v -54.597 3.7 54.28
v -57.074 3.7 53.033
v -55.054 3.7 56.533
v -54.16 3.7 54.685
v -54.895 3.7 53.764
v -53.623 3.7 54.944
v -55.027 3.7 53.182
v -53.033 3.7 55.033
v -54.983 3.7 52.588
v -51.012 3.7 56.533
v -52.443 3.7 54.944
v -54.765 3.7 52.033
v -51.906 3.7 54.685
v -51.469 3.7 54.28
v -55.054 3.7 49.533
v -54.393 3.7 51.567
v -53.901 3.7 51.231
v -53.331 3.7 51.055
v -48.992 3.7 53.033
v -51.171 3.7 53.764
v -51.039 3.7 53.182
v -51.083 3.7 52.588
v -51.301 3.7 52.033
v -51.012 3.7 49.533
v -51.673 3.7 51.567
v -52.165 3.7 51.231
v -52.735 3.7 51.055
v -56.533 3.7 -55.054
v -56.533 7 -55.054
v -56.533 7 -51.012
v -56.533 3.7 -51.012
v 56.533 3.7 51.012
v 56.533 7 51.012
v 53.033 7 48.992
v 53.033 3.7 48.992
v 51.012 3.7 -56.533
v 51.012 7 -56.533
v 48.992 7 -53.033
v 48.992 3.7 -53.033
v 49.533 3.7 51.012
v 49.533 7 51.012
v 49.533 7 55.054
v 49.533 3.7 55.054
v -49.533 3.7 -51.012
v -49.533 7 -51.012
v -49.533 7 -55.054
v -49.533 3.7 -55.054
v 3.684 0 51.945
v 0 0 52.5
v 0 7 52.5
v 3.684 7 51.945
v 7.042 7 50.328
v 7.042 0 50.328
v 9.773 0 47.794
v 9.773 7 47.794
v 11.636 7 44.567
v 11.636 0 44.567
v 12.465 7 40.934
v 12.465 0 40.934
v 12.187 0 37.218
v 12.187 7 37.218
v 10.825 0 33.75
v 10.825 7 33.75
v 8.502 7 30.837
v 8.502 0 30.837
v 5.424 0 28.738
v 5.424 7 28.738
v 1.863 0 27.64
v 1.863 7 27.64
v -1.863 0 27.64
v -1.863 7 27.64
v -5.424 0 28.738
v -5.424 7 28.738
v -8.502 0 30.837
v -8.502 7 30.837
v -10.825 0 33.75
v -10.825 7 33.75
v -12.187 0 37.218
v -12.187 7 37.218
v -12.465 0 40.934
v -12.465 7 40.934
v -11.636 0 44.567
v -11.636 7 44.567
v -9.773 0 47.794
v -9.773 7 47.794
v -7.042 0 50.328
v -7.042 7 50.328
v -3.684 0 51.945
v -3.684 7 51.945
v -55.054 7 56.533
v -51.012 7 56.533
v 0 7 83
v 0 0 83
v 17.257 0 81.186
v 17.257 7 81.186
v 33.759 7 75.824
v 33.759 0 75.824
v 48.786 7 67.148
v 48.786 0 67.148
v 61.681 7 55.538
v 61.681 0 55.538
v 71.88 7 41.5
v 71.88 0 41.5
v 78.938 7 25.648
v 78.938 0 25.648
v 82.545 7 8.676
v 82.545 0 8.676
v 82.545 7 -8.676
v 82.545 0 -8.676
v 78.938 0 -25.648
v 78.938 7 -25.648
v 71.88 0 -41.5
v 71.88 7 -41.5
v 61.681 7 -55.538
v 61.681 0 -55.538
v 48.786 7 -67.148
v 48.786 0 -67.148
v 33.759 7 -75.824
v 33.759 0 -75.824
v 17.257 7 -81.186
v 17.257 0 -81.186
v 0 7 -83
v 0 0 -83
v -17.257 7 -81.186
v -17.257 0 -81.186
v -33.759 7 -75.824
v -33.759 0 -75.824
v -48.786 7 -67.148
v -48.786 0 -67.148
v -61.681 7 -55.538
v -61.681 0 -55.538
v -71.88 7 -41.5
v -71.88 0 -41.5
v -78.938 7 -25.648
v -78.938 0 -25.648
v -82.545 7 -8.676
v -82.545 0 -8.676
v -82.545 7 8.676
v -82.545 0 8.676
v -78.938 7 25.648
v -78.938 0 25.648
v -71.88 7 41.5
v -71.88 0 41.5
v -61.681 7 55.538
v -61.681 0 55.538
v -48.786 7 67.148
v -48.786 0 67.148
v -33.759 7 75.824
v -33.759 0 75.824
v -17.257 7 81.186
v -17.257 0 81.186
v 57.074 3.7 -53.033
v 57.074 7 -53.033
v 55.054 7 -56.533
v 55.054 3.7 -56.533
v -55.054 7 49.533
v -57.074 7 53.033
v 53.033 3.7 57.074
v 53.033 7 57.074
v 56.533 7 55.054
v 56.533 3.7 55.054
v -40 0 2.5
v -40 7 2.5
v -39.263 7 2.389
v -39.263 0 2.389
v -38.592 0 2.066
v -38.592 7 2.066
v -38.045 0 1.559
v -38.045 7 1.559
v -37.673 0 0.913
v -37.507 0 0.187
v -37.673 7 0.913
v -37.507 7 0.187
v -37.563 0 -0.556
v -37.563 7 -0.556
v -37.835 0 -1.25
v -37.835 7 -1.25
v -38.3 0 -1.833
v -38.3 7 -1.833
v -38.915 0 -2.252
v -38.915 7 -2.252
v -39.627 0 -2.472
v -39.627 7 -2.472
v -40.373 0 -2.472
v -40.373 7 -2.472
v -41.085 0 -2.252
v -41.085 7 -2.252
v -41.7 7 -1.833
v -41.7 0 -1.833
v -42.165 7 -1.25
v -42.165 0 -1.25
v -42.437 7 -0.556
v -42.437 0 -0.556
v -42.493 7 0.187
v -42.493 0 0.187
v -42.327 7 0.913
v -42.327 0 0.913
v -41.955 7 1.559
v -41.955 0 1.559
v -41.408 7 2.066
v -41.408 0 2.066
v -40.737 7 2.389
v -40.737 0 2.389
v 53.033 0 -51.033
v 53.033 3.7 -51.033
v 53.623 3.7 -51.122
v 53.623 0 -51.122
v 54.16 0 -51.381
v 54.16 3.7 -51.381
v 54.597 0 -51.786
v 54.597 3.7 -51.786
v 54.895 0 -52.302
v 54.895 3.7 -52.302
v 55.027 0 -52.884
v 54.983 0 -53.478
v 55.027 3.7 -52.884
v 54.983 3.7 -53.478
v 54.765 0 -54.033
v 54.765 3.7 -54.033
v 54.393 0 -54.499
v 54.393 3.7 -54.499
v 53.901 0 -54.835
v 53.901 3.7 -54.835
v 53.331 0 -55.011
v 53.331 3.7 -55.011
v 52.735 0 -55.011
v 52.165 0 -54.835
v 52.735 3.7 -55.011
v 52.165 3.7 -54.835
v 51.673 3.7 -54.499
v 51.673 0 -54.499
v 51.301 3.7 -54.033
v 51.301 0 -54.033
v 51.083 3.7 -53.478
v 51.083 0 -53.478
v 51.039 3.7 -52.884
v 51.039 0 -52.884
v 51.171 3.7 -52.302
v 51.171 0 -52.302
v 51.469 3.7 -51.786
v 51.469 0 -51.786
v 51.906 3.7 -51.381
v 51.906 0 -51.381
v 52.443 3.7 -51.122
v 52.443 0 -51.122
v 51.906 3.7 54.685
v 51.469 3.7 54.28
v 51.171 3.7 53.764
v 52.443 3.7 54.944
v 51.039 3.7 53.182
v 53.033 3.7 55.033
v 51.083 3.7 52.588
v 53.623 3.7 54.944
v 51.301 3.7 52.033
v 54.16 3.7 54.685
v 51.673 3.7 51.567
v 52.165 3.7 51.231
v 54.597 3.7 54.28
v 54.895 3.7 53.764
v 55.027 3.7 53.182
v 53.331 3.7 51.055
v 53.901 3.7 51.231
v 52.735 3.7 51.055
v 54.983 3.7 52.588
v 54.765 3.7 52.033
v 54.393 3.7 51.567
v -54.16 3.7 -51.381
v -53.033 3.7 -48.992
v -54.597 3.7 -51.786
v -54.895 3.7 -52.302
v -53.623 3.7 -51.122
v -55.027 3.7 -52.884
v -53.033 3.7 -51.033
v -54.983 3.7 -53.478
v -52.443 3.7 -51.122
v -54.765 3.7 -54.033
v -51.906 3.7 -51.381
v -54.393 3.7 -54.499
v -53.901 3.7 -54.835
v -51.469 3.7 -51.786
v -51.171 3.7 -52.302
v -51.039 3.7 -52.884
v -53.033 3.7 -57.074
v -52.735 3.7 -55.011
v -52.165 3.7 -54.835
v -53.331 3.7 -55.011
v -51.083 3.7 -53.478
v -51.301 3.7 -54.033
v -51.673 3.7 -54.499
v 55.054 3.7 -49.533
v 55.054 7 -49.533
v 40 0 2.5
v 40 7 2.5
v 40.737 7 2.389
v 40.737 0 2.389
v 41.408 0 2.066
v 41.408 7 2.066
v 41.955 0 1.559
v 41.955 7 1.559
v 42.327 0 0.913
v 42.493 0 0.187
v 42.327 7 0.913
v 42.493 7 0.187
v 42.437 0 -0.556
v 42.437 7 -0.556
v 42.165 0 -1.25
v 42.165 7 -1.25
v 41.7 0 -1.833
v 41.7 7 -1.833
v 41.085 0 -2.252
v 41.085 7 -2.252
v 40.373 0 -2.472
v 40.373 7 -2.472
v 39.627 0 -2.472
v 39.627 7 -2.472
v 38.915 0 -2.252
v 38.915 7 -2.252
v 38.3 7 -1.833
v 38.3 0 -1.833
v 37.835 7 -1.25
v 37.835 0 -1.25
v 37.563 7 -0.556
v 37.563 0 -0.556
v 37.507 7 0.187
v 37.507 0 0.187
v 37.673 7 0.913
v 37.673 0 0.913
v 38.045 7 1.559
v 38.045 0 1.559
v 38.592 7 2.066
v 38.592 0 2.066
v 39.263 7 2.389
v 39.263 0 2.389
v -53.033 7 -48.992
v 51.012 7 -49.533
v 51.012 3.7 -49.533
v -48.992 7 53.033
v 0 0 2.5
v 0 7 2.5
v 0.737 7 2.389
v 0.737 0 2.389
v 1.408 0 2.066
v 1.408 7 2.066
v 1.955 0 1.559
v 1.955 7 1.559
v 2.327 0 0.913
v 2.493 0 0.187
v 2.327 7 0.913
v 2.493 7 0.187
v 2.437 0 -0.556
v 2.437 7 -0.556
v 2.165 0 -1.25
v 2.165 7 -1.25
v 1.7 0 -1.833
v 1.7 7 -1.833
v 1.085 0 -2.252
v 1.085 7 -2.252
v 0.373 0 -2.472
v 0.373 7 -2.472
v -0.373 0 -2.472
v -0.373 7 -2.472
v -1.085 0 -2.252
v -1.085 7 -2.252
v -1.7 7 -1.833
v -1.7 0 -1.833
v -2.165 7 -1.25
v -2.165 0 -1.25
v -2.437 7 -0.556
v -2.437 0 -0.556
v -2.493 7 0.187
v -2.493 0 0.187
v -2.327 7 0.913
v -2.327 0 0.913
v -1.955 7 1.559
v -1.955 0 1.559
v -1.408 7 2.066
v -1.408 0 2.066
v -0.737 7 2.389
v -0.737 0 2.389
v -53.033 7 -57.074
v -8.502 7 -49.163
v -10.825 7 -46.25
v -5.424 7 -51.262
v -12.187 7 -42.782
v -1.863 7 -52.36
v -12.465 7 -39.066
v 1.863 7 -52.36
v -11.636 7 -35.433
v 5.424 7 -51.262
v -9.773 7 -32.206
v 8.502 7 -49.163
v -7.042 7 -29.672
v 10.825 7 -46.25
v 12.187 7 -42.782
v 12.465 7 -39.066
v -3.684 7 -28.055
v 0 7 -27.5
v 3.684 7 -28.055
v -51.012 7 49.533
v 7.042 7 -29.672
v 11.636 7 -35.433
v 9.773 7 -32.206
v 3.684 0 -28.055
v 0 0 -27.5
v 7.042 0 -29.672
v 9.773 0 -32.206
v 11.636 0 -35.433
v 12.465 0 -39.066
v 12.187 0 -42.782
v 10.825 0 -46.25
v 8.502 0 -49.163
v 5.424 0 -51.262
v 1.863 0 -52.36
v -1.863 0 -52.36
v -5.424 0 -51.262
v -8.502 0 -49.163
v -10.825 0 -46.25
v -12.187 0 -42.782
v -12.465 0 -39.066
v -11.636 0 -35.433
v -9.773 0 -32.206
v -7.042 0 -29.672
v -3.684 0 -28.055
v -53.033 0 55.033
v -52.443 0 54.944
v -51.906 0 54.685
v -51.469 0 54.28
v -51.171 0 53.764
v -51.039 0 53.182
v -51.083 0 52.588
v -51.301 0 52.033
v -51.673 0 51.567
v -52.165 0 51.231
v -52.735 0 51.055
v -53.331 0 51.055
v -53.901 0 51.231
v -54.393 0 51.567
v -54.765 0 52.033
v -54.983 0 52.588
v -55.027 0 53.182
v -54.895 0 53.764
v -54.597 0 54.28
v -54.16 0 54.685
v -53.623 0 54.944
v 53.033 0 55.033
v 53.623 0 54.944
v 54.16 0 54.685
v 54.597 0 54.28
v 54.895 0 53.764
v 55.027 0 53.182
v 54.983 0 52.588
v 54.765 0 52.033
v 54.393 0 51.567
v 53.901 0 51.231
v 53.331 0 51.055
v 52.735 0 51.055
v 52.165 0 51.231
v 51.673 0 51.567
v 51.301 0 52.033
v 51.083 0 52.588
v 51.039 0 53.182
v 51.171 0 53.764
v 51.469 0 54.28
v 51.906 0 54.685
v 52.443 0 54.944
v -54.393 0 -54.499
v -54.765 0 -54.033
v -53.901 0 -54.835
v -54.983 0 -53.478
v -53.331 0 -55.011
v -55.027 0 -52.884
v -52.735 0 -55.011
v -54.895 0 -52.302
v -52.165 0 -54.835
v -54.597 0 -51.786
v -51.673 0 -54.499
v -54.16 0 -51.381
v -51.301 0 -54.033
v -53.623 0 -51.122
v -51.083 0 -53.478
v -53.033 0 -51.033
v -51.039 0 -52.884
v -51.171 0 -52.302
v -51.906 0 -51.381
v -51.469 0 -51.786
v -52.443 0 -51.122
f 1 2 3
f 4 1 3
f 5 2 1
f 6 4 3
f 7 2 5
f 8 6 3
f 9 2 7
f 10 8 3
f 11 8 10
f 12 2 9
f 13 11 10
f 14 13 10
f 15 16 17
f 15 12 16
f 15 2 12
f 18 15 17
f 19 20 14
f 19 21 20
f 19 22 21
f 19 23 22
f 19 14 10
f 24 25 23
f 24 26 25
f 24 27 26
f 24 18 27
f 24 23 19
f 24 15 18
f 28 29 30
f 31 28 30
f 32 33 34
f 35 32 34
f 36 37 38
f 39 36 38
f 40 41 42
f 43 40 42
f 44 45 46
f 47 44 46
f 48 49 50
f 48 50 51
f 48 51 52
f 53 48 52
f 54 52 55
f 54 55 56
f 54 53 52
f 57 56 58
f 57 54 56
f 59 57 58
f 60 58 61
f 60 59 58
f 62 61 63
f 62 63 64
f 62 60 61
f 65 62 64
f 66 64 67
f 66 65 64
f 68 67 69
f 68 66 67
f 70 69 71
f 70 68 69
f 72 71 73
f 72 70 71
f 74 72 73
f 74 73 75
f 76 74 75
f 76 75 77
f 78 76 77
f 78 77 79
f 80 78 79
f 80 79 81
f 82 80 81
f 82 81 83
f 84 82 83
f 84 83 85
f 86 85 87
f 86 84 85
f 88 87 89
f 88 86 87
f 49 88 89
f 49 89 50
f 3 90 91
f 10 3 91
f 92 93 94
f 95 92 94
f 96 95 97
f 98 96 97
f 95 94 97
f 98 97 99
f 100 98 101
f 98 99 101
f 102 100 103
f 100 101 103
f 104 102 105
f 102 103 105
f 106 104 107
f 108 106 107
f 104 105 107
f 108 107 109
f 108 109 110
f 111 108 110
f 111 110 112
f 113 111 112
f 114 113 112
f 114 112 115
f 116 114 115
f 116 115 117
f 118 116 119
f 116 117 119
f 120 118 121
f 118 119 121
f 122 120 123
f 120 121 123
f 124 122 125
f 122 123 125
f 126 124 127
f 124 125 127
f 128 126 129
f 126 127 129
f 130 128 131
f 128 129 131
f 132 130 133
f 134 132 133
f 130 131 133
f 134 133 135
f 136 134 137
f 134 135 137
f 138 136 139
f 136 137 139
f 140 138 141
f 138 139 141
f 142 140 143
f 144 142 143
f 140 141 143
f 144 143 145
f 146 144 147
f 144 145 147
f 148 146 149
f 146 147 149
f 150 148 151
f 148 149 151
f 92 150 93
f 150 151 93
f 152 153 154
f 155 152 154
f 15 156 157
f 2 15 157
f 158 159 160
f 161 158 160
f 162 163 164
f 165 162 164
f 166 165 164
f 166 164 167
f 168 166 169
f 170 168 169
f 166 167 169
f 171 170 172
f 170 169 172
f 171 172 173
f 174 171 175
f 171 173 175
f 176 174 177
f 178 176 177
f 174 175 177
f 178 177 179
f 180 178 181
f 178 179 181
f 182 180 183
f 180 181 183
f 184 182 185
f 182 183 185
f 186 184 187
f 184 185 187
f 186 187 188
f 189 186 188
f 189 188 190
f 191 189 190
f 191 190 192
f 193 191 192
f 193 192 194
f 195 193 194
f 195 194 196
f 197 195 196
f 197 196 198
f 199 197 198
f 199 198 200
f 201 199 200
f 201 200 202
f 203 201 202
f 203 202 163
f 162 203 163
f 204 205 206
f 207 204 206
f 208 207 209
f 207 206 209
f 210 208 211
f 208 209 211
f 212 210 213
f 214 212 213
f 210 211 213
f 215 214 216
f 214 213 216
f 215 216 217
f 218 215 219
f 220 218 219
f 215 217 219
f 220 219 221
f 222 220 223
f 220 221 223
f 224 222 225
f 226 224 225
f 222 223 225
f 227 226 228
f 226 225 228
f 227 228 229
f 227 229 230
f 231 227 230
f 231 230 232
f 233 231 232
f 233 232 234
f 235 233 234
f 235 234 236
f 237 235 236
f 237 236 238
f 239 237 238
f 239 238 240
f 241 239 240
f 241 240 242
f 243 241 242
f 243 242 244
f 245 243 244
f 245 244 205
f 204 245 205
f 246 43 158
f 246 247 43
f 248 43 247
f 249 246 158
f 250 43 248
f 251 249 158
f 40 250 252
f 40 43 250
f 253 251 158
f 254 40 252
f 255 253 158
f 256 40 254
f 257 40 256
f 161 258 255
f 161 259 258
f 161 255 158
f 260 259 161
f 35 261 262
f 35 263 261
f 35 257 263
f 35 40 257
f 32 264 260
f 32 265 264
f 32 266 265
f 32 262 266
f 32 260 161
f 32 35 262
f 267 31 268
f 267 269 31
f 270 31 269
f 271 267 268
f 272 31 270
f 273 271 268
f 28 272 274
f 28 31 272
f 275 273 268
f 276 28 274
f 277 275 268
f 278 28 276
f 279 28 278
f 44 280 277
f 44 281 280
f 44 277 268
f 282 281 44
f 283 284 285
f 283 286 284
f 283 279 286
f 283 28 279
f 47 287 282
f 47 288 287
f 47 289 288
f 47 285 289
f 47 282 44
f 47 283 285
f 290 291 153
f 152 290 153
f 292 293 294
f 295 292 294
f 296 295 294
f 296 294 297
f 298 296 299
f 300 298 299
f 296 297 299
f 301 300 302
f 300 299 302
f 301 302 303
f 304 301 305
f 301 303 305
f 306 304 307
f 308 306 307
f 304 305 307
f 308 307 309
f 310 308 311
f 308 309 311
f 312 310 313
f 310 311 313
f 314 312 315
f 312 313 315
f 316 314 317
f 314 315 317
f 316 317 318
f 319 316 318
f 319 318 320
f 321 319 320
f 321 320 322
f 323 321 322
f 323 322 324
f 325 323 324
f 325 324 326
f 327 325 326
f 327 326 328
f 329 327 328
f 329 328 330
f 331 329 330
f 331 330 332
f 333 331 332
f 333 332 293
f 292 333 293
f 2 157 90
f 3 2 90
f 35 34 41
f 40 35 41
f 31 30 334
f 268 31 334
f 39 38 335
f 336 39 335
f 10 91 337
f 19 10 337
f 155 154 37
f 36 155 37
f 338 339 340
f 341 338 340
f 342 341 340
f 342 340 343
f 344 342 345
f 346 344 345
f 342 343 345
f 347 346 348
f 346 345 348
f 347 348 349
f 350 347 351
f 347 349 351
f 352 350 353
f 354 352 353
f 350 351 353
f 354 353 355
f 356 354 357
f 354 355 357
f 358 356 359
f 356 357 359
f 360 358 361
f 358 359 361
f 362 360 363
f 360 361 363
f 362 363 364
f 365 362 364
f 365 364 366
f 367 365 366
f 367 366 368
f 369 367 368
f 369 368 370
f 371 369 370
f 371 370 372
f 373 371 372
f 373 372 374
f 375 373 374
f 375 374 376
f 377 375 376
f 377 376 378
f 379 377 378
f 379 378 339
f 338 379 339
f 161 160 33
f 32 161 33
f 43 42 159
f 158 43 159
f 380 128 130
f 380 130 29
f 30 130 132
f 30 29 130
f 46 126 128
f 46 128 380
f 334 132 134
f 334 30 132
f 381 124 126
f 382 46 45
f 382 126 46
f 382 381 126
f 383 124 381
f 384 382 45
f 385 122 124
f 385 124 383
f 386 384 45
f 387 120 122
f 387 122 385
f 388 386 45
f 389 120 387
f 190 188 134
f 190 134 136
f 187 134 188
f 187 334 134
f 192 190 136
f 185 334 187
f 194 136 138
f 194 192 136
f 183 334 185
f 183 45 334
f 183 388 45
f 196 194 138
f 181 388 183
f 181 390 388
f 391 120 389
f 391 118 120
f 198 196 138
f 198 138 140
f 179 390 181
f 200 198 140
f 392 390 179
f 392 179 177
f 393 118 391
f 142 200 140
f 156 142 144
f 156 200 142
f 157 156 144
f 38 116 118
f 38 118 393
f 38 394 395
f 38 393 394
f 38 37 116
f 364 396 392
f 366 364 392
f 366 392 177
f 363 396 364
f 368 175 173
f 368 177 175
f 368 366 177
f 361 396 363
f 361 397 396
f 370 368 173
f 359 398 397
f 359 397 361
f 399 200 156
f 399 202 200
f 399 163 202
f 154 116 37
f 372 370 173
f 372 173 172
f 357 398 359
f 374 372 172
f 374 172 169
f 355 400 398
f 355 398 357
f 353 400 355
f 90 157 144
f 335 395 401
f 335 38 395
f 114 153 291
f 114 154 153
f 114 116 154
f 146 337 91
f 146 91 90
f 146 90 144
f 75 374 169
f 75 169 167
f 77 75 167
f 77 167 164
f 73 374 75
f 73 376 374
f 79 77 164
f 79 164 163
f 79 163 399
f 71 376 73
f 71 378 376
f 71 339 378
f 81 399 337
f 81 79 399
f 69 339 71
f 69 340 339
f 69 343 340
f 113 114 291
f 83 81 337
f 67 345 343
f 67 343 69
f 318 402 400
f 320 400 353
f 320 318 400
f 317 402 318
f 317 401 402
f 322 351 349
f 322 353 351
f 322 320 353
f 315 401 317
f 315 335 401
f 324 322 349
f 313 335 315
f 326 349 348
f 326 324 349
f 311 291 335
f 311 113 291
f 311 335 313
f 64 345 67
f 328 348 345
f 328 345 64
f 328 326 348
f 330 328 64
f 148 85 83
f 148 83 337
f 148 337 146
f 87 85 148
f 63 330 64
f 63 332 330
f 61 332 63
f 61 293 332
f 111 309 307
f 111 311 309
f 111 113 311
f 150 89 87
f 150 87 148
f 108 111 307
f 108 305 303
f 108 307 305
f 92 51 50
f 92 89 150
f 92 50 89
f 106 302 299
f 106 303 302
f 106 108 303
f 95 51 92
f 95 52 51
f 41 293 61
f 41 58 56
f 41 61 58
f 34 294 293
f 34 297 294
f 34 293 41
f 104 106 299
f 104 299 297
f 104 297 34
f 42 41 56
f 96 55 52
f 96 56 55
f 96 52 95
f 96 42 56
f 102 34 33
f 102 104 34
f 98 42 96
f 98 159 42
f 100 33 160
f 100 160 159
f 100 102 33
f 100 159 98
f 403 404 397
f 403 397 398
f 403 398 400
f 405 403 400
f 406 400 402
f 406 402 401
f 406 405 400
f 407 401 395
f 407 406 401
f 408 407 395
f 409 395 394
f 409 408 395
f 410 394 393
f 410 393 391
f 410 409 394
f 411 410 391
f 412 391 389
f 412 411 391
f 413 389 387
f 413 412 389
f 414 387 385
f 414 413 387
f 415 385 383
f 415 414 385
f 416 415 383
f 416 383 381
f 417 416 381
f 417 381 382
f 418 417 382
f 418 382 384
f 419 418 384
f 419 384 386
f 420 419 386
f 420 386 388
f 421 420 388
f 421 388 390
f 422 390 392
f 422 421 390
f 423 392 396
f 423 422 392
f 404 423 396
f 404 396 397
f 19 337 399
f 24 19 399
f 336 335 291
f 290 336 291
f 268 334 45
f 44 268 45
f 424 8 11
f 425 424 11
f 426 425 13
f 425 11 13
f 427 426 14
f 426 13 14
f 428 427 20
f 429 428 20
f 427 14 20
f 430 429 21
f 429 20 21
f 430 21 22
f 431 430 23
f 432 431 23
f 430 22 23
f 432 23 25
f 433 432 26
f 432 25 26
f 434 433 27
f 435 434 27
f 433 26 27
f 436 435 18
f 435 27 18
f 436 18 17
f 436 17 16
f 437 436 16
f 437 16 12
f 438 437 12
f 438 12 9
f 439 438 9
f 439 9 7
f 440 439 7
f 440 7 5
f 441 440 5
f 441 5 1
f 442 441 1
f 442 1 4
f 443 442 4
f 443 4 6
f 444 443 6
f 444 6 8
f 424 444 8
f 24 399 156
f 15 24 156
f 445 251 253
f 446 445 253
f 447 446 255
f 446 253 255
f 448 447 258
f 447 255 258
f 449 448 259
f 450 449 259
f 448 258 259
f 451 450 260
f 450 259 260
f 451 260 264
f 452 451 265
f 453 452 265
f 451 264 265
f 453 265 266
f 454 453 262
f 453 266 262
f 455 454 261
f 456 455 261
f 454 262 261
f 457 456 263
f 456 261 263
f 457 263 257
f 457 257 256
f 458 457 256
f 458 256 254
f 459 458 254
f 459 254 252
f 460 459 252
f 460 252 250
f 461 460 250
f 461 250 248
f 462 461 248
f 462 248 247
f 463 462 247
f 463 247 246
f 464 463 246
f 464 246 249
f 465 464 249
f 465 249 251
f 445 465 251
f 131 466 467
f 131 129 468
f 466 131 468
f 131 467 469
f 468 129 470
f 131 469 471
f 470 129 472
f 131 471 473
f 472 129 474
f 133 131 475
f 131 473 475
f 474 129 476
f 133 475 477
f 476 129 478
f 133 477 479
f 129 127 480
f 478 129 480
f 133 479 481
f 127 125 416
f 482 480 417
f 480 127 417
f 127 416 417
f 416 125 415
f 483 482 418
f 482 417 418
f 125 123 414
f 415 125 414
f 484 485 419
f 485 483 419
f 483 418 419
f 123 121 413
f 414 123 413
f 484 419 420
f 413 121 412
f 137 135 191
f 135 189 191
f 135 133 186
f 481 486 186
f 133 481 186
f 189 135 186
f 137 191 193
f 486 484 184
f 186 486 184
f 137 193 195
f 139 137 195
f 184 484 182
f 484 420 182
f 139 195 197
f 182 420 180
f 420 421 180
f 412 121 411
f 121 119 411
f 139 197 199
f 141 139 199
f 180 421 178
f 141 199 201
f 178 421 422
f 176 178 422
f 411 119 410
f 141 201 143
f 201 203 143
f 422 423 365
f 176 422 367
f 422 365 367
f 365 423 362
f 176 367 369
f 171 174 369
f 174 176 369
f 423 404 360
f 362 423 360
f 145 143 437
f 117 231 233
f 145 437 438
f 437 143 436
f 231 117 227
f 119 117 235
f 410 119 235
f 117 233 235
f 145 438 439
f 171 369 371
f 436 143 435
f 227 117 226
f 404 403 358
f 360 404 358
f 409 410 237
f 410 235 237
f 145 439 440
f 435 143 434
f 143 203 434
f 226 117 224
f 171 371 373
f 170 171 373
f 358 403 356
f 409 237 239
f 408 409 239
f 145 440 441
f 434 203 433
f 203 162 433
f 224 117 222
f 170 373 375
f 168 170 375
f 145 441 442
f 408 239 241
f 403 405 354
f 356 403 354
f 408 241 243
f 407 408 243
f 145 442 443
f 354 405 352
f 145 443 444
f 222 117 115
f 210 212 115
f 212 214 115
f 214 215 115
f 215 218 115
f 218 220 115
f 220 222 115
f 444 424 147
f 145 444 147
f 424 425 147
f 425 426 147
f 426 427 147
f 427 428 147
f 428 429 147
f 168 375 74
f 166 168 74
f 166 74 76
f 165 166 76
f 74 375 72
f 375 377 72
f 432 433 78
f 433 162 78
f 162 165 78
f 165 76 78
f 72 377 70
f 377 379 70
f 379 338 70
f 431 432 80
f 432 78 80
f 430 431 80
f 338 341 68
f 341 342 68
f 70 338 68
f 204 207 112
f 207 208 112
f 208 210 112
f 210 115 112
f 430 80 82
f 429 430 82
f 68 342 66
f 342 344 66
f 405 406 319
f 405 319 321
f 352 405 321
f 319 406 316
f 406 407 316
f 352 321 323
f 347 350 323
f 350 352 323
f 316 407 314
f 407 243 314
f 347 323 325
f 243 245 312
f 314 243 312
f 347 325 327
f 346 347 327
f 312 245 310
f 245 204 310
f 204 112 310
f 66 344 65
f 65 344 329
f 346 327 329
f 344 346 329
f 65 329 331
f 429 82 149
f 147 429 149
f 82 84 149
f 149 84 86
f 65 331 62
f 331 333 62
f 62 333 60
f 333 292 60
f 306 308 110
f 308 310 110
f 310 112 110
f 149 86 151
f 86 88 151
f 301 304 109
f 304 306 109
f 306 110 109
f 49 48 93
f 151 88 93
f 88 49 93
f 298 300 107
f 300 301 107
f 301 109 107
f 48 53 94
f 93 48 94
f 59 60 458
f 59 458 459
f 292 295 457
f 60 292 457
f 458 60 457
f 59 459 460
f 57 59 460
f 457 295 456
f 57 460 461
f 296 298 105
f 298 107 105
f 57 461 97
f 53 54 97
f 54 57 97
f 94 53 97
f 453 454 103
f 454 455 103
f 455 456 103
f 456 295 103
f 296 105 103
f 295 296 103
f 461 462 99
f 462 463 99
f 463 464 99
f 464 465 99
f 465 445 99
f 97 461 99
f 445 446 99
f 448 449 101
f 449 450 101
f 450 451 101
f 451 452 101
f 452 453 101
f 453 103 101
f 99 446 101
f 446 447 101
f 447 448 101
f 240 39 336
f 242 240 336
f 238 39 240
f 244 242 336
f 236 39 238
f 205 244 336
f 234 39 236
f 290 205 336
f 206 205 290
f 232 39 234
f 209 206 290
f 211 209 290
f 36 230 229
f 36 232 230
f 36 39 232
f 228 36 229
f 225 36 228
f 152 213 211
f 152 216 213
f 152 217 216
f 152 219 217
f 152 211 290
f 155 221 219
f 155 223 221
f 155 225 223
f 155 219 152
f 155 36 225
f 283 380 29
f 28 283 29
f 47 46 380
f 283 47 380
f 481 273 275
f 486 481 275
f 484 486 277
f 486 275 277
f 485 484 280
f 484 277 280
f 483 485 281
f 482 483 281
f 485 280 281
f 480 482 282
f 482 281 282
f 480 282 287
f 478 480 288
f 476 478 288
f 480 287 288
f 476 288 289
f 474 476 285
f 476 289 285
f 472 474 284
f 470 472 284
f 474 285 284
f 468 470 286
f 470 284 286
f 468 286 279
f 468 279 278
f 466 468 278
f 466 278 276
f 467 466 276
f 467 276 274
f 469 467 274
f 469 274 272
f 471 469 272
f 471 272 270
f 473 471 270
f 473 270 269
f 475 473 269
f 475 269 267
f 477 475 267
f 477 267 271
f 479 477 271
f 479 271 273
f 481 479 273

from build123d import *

# Parameters (mm, degrees)
SKETCH1_R           = 83
SKETCH1_R_2         = 12.5
BOSS_EXTRUDE1_DEPTH = 7
SKETCH14_R          = 2
CUT_EXTRUDE2_DEPTH  = 133
CUT_EXTRUDE3_DEPTH  = 3.3
SKETCH16_R          = 2.5
CUT_EXTRUDE4_DEPTH  = 10


with BuildPart() as part:
    # Sketch1 → Boss-Extrude1 (new body)
    with BuildSketch(Plane(origin=(0, 0, 0), x_dir=(1, 0, 0), z_dir=(0, 1, 0))):
        with Locations(Location((0, 0, 0), (0, 0, 270))):
            Circle(SKETCH1_R)
        with Locations(Location((0, 40, 0), (0, 0, 270))):
            Circle(SKETCH1_R_2, mode=Mode.SUBTRACT)
        with Locations(Location((0, -40, 0), (0, 0, 270))):
            Circle(SKETCH1_R_2, mode=Mode.SUBTRACT)
    extrude(amount=BOSS_EXTRUDE1_DEPTH)

    # Sketch14 → Cut-Extrude2 (cut)
    with BuildSketch(Plane(origin=(0, 7, 0), x_dir=(1, 0, 0), z_dir=(0, 1, 0))):
        with Locations(Location((-53.033008589, 53.033008589, 0), (0, 0, 270))):
            Circle(SKETCH14_R)
        with Locations(Location((53.033008589, 53.033008589, 0), (0, 0, 270))):
            Circle(SKETCH14_R)
        with Locations(Location((53.033008589, -53.033008589, 0), (0, 0, 270))):
            Circle(SKETCH14_R)
        with Locations(Location((-53.033008589, -53.033008589, 0), (0, 0, 270))):
            Circle(SKETCH14_R)
    extrude(amount=-CUT_EXTRUDE2_DEPTH, mode=Mode.SUBTRACT)

    # Sketch15 → Cut-Extrude3 (cut)
    with BuildSketch(Plane(origin=(0, 7, 0), x_dir=(1, 0, 0), z_dir=(0, 1, 0))):
        Polygon((-49.533008589, 55.053734531), (-53.033008589, 57.074460473), (-56.533008589, 55.053734531), (-56.533008589, 51.012282647), (-53.033008589, 48.991556705), (-49.533008589, 51.012282647), align=None)
        Polygon((55.053734531, 49.533008589), (57.074460473, 53.033008589), (55.053734531, 56.533008589), (51.012282647, 56.533008589), (48.991556705, 53.033008589), (51.012282647, 49.533008589), align=None)
        Polygon((49.533008589, -55.053734531), (53.033008589, -57.074460473), (56.533008589, -55.053734531), (56.533008589, -51.012282647), (53.033008589, -48.991556705), (49.533008589, -51.012282647), align=None)
        Polygon((-55.053734531, -49.533008589), (-57.074460473, -53.033008589), (-55.053734531, -56.533008589), (-51.012282647, -56.533008589), (-48.991556705, -53.033008589), (-51.012282647, -49.533008589), align=None)
    extrude(amount=-CUT_EXTRUDE3_DEPTH, mode=Mode.SUBTRACT)

    # Sketch16 → Cut-Extrude4 (cut)
    with BuildSketch(Plane(origin=(0, 7, 0), x_dir=(1, 0, 0), z_dir=(0, 1, 0))):
        with Locations(Location((-40, 0, 0), (0, 0, 270))):
            Circle(SKETCH16_R)
        with Locations(Location((40, 0, 0), (0, 0, 270))):
            Circle(SKETCH16_R)
        with Locations(Location((0, 0, 0), (0, 0, 270))):
            Circle(SKETCH16_R)
    extrude(amount=-CUT_EXTRUDE4_DEPTH, mode=Mode.SUBTRACT)


solid = part.part
